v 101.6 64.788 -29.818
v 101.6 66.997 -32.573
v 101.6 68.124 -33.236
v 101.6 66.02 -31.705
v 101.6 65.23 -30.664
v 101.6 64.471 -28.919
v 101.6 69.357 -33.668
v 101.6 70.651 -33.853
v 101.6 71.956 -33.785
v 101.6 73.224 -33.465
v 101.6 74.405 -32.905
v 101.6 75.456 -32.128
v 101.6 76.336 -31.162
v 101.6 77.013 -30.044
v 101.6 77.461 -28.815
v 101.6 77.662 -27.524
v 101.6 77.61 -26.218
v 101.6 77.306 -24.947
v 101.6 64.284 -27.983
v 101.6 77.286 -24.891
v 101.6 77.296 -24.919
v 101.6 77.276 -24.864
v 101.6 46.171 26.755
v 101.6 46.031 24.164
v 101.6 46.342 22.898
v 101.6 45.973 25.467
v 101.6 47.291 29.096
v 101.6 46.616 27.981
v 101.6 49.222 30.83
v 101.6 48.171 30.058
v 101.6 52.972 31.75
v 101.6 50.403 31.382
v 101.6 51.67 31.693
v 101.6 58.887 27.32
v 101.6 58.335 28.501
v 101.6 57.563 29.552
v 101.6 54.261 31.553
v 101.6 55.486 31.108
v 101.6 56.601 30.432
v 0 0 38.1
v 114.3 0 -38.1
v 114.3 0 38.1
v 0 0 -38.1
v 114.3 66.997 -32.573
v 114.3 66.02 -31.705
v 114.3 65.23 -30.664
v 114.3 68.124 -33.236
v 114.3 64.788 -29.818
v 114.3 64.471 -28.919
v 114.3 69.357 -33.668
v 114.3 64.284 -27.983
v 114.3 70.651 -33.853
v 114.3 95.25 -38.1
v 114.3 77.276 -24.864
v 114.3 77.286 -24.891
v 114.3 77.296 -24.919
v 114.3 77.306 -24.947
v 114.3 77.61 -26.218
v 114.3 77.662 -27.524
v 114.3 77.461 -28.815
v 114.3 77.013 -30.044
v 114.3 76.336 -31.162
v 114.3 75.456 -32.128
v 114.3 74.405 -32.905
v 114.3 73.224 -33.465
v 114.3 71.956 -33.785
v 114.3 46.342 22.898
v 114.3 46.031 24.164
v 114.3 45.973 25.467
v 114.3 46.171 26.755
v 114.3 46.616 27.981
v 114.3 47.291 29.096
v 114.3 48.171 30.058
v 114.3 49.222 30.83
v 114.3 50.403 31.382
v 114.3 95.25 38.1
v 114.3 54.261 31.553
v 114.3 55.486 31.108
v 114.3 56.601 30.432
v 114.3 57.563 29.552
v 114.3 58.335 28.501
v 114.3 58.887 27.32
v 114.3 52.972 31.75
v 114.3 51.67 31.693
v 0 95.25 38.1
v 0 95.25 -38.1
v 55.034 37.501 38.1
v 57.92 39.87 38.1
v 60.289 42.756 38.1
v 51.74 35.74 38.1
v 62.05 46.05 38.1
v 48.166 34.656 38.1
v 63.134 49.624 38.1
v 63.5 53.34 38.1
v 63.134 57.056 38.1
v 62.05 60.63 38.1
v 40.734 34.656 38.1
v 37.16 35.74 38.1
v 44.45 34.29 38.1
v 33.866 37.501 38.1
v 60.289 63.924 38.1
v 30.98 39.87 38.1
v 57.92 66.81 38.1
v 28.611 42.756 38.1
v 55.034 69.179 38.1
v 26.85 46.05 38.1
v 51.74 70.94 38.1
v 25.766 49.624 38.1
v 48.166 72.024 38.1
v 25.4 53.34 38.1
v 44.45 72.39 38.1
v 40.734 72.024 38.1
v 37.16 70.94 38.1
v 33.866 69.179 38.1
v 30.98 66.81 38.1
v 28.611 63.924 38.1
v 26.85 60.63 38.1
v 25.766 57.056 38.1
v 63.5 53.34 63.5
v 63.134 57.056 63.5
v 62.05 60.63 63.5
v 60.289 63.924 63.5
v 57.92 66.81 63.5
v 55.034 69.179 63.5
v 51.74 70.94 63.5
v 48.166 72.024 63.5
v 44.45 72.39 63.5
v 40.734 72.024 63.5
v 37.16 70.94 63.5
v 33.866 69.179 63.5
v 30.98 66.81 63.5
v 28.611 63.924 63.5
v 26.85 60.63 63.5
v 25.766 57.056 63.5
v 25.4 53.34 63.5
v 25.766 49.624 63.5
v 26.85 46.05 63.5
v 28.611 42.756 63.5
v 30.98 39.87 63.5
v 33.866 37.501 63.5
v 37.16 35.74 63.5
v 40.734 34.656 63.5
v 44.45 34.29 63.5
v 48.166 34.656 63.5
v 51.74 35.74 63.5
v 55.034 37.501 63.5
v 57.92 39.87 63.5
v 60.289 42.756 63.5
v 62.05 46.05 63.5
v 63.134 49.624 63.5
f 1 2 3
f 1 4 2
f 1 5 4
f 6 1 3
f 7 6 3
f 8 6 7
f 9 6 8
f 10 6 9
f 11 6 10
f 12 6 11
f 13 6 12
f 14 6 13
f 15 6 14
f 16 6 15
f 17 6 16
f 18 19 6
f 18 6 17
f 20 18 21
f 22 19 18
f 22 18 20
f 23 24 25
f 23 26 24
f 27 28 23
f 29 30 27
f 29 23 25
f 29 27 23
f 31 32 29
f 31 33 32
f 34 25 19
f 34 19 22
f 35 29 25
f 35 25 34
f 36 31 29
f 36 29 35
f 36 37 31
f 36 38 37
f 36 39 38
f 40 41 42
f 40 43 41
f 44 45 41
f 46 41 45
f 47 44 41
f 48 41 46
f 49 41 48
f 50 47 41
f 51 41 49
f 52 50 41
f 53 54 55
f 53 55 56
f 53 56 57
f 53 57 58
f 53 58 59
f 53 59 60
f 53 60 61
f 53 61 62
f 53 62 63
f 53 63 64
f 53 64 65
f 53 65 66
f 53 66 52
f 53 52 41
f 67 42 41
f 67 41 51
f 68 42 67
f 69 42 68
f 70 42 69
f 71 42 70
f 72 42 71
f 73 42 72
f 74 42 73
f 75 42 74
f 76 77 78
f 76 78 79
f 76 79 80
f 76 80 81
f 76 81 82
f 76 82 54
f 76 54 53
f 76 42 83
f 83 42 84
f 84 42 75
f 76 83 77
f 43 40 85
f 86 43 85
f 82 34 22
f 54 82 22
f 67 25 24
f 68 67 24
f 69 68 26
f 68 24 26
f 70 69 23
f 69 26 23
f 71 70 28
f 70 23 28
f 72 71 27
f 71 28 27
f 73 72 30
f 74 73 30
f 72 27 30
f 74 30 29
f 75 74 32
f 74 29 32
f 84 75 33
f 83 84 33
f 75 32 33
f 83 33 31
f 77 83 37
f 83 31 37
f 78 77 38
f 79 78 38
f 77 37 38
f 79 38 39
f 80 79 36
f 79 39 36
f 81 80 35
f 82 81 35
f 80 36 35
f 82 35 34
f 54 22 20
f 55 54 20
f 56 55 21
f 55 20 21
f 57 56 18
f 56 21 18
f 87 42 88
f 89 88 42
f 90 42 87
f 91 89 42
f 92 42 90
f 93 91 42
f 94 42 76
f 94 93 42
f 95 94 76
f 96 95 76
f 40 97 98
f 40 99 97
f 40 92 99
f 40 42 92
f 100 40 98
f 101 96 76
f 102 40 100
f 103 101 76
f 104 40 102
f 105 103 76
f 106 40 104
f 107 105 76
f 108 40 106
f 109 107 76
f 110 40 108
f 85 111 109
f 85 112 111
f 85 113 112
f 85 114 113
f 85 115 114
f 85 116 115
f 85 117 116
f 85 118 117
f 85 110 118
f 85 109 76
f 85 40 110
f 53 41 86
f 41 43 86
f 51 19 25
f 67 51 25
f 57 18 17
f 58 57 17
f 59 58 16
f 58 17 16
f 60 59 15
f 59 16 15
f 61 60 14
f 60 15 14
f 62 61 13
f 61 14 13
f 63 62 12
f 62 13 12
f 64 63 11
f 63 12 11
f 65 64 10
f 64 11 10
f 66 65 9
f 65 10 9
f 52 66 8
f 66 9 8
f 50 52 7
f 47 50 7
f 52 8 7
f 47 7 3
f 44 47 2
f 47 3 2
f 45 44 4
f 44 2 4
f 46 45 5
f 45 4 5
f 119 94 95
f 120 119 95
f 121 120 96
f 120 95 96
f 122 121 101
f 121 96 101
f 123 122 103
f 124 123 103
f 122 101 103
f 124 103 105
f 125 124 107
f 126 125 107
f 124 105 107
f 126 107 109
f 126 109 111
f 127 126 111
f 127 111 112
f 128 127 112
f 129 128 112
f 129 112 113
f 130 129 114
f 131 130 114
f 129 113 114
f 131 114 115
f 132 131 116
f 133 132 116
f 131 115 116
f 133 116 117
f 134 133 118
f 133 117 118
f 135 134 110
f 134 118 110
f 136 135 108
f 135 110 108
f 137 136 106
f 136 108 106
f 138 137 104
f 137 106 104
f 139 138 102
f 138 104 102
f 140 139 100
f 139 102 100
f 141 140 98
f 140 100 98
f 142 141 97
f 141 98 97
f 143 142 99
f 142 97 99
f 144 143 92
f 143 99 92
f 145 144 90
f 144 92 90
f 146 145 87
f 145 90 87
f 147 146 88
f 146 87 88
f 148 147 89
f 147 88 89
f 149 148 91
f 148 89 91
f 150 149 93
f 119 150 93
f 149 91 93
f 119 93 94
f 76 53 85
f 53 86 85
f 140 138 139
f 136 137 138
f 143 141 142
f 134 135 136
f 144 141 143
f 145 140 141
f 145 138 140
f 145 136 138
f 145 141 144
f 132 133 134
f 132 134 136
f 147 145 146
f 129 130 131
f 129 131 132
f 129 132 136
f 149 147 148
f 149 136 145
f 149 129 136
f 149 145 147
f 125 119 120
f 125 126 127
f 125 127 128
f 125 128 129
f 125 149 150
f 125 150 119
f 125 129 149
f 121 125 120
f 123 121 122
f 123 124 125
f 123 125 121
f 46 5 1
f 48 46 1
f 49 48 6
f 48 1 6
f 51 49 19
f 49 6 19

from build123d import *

# Parameters (mm, degrees)
F0_W          = 101.6
F0_H          = 95.25
F1_DEPTH      = 38.1
F1_DEPTH_BACK = 38.1
F2_R          = 19.05
F3_DEPTH      = 25.4
F4_W          = 95.25
F4_H          = 76.2
F5_DEPTH      = 12.7


with BuildPart() as f1:
    # F0 (on Top) → F1 (new body, two sides)
    with BuildSketch(Plane.XY) as f1_sk:
        with Locations((50.8, 47.625)):
            Rectangle(F0_W, F0_H)
    extrude(amount=F1_DEPTH)
    extrude(f1_sk.sketch, amount=-F1_DEPTH_BACK)

    # F2 (on face) → F3 (join)
    with BuildSketch(Plane.XY.offset(38.1)):
        with Locations((44.45, 53.34)):
            Circle(F2_R)
    extrude(amount=F3_DEPTH)

    # F4 (on face) → F5 (join)
    with BuildSketch(Plane.YZ.offset(101.6)):
        with Locations((47.625, 0)):
            Rectangle(F4_W, F4_H)
        with BuildLine():
            ThreePointArc((46.342392, 22.897961), (50.403336, 31.381813), (58.886788, 27.320033))
            Line((58.886788, 27.320033), (77.276431, -24.863524))
            ThreePointArc((77.276431, -24.863524), (77.291216, -24.905044), (77.305728, -24.94666))
            ThreePointArc((77.305728, -24.94666), (73.828073, -33.213667), (65.22953, -30.663658))
            ThreePointArc((65.22953, -30.663658), (64.613677, -29.374051), (64.284402, -27.983389))
            Line((64.284402, -27.983389), (46.342392, 22.897961))
        make_face(mode=Mode.SUBTRACT)
    extrude(amount=F5_DEPTH)


solid = f1.part
